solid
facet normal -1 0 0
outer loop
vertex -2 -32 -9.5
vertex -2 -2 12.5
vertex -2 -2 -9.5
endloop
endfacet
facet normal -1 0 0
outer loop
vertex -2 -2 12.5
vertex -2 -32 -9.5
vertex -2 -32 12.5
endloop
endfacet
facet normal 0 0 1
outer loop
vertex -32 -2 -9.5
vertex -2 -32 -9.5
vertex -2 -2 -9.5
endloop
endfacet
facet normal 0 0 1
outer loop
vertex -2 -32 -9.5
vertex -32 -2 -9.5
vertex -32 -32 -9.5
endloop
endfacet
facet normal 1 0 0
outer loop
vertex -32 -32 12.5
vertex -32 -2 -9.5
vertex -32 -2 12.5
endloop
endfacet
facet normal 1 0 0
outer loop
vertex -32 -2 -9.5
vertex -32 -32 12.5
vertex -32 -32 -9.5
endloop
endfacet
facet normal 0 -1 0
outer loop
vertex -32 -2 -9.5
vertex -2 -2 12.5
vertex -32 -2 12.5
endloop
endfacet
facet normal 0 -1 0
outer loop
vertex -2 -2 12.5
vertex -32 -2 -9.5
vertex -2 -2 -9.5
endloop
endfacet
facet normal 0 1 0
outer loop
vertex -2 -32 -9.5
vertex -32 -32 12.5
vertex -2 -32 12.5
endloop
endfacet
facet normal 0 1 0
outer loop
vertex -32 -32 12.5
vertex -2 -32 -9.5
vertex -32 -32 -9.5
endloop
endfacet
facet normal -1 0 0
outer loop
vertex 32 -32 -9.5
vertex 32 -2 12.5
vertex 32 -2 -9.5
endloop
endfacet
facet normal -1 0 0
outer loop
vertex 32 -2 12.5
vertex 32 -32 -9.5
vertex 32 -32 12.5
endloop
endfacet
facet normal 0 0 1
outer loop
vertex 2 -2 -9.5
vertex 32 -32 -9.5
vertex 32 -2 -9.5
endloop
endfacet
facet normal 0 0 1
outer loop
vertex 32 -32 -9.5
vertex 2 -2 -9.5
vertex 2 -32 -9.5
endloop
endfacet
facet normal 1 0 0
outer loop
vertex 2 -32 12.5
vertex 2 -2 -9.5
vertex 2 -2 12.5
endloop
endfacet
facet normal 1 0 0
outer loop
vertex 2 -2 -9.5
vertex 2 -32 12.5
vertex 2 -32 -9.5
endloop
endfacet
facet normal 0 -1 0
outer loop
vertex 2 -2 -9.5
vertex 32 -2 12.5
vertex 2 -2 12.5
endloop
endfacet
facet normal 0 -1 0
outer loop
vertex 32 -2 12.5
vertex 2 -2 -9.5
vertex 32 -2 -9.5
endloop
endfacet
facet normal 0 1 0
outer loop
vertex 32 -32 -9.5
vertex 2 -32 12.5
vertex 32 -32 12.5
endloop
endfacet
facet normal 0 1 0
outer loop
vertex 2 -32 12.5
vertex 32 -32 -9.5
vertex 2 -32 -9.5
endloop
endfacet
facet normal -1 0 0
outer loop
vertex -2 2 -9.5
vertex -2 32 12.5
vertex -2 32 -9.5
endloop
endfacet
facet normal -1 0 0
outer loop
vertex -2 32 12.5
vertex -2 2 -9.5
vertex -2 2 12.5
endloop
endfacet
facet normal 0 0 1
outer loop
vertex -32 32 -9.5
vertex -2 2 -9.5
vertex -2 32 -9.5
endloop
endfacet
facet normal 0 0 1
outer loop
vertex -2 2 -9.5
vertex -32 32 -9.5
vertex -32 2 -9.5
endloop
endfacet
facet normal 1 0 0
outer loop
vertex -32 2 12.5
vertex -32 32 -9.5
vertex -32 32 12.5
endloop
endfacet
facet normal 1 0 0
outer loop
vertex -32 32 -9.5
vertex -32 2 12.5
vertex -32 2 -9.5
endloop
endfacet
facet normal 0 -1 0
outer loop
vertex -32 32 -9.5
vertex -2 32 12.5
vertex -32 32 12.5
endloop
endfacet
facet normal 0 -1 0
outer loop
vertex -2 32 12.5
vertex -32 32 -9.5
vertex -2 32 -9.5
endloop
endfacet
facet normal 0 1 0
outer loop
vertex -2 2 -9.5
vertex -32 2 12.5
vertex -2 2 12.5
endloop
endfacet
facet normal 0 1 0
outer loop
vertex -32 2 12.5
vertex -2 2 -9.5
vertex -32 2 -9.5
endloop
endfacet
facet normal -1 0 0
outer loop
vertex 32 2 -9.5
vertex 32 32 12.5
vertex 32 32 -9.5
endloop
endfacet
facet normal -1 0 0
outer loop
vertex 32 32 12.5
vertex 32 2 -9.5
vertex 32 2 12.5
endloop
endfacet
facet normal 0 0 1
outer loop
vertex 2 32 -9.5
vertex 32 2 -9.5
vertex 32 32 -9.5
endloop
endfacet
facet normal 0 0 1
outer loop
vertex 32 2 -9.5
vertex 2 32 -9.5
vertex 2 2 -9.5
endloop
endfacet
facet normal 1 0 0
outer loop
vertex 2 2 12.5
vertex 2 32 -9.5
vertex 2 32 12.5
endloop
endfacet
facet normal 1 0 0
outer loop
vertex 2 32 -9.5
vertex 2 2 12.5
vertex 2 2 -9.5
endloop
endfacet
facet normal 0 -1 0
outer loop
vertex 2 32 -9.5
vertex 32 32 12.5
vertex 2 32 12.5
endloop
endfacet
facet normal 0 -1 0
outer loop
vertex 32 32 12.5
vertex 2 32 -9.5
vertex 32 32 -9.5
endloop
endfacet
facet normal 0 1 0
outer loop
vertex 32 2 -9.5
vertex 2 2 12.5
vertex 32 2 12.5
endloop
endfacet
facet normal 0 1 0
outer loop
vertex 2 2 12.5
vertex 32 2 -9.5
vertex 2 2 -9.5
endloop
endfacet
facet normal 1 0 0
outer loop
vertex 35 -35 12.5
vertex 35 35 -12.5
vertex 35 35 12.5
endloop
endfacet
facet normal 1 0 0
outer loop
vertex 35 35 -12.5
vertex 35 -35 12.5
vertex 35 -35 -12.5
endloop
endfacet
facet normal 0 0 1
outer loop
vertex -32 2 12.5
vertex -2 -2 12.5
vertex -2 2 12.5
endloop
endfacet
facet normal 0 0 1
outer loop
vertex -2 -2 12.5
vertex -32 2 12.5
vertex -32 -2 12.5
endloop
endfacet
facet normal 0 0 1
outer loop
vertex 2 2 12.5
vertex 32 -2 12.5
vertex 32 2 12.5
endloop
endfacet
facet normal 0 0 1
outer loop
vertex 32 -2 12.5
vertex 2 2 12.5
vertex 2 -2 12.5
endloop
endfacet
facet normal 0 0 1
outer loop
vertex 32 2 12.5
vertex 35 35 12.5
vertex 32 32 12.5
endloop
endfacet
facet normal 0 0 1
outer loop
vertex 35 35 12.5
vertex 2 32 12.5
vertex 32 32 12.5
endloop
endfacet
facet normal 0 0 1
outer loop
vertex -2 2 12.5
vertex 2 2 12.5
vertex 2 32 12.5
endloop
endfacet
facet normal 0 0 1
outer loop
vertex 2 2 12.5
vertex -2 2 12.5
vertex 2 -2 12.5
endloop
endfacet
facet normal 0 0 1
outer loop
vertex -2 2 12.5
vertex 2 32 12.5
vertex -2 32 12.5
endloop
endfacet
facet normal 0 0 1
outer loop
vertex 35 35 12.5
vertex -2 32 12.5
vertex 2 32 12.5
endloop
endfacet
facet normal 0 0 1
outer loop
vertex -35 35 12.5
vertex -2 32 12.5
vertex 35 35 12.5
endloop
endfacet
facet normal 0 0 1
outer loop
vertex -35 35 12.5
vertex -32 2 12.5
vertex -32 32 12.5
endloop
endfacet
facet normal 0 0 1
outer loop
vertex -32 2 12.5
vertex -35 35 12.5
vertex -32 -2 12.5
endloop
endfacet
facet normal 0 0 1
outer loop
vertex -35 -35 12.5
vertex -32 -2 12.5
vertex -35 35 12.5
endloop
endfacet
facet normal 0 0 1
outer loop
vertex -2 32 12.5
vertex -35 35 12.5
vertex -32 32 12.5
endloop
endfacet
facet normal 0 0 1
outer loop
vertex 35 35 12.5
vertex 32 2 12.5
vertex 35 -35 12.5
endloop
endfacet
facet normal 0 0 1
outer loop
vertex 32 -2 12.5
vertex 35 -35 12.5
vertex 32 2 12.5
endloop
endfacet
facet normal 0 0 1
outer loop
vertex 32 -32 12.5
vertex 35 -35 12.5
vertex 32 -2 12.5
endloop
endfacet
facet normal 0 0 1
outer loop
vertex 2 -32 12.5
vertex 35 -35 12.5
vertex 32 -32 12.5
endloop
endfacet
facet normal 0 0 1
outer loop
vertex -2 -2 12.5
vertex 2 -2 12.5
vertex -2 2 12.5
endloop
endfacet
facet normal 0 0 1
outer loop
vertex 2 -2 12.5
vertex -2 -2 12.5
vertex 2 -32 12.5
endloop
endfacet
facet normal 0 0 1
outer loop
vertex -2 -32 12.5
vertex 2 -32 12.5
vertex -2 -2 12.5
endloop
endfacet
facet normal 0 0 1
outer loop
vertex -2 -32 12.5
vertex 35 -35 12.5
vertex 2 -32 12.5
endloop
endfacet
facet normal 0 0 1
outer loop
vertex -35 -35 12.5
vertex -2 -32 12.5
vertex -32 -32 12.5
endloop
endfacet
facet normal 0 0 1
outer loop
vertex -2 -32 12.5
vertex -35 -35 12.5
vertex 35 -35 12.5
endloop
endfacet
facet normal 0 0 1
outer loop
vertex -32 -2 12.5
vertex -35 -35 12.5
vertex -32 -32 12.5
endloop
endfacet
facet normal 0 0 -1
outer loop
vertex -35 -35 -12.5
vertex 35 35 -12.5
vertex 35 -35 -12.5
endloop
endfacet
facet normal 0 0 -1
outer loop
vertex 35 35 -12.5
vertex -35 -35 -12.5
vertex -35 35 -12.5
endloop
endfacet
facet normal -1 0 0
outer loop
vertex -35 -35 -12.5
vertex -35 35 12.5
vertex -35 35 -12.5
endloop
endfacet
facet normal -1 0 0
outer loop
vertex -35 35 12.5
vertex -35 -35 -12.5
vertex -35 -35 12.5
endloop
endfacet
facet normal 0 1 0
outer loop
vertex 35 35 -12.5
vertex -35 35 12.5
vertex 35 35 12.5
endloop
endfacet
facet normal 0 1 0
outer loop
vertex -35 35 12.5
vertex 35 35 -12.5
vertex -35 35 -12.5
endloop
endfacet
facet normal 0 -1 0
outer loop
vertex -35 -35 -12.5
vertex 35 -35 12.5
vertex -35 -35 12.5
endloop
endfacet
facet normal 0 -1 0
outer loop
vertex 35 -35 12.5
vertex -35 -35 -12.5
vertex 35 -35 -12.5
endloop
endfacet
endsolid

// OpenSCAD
$fn = 32;

// ----------------------------------------------------------------------
// Pocket plate 70 x 70 x 25
// 2 x 2 pockets 30 mm square, 22 mm deep
// ----------------------------------------------------------------------

// --- parameters (mm) ---
thickness = 25;  // plate thickness
floor_t = 3;     // material left under each pocket
pocket = 30;     // pocket side length
pitch_x = 34;    // pocket pitch along X
pitch_y = 34;    // pocket pitch along Y
cols = 2;        // pockets per row
rows = 2;        // rows of pockets

// --- derived feature positions (mm) ---
depth = thickness - floor_t;        // = 22   pocket depth, down to the floor
span_x = (cols - 1) * pitch_x;      // = 34   distance between outer pockets
span_y = (rows - 1) * pitch_y;      // = 34   distance between outer pocket rows
origin_x = -span_x / 2;             // = -17   X of the first pocket
origin_y = -span_y / 2;             // = -17   Y of the first pocket
plate = [span_x + pocket + 6, span_y + pocket + 6, thickness];  // = [70, 70, 25]   overall size: pockets plus 3 mm of wall on each side
feature_centers = [
  [origin_x + 0 * pitch_x, origin_y + 0 * pitch_y],
  [origin_x + 1 * pitch_x, origin_y + 0 * pitch_y],
  [origin_x + 0 * pitch_x, origin_y + 1 * pitch_y],
  [origin_x + 1 * pitch_x, origin_y + 1 * pitch_y]
];   // pocket centres, used verbatim by the cutter loop

// plate outline, then one pocket per centre in feature_centers
difference() {
  cube(plate, center = true);
  for (centre = feature_centers)
    translate([centre[0] - pocket / 2, centre[1] - pocket / 2, plate[2] / 2 - depth])
      cube([pocket, pocket, depth + 1]);  // centred on the declared pocket centre
}
